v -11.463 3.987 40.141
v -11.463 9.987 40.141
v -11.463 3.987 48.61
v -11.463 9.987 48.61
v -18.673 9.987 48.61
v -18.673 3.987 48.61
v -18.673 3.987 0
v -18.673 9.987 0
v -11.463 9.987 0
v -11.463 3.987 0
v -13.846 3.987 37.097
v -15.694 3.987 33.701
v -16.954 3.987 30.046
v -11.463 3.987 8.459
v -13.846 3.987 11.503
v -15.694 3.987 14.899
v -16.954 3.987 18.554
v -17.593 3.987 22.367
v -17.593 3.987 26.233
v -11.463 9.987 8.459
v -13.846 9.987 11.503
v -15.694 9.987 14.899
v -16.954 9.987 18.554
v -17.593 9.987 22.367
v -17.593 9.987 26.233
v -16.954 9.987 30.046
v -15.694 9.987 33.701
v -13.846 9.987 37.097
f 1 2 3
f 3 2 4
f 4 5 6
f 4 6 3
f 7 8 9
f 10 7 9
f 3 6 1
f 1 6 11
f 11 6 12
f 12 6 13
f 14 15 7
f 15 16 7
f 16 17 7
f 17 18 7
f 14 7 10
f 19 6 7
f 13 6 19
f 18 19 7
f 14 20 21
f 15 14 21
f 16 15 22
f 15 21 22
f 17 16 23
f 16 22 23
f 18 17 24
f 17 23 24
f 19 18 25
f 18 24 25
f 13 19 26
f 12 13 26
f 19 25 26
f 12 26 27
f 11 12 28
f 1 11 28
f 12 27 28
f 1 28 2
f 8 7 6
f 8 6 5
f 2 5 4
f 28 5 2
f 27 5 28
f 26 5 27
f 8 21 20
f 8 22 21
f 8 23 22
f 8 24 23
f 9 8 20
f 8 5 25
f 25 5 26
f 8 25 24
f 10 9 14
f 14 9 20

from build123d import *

# Parameters (mm, degrees)
SKETCH1_W           = 24.21
SKETCH1_H           = 6
BOSS_EXTRUDE1_DEPTH = 48.61
CUT_EXTRUDE1_DEPTH  = 53.417790043


with BuildPart() as part:
    # Sketch1 → Boss-Extrude1 (new body)
    with BuildSketch(Plane.XY):
        with Locations((-6.568312856, 6.986625)):
            Rectangle(SKETCH1_W, SKETCH1_H)
    extrude(amount=BOSS_EXTRUDE1_DEPTH)

    # Sketch3 → Cut-Extrude1 (cut, through all)
    with BuildSketch(Plane(origin=(0, 9.986625, 0), x_dir=(1, 0, 0), z_dir=(0, 1, 0))):
        with BuildLine():
            Line((-11.463312856, 0), (-11.463312856, -8.458721642))
            ThreePointArc((-11.463312856, -8.458721642), (-17.673312856, -24.3), (-11.463312856, -40.141278358))
            Line((-11.463312856, -40.141278358), (-11.463312856, -48.61))
            Line((-11.463312856, -48.61), (5.536687144, -48.61))
            Line((5.536687144, -48.61), (5.536687144, 0))
            Line((5.536687144, 0), (-11.463312856, 0))
        make_face()
    extrude(amount=-CUT_EXTRUDE1_DEPTH, mode=Mode.SUBTRACT)


solid = part.part
